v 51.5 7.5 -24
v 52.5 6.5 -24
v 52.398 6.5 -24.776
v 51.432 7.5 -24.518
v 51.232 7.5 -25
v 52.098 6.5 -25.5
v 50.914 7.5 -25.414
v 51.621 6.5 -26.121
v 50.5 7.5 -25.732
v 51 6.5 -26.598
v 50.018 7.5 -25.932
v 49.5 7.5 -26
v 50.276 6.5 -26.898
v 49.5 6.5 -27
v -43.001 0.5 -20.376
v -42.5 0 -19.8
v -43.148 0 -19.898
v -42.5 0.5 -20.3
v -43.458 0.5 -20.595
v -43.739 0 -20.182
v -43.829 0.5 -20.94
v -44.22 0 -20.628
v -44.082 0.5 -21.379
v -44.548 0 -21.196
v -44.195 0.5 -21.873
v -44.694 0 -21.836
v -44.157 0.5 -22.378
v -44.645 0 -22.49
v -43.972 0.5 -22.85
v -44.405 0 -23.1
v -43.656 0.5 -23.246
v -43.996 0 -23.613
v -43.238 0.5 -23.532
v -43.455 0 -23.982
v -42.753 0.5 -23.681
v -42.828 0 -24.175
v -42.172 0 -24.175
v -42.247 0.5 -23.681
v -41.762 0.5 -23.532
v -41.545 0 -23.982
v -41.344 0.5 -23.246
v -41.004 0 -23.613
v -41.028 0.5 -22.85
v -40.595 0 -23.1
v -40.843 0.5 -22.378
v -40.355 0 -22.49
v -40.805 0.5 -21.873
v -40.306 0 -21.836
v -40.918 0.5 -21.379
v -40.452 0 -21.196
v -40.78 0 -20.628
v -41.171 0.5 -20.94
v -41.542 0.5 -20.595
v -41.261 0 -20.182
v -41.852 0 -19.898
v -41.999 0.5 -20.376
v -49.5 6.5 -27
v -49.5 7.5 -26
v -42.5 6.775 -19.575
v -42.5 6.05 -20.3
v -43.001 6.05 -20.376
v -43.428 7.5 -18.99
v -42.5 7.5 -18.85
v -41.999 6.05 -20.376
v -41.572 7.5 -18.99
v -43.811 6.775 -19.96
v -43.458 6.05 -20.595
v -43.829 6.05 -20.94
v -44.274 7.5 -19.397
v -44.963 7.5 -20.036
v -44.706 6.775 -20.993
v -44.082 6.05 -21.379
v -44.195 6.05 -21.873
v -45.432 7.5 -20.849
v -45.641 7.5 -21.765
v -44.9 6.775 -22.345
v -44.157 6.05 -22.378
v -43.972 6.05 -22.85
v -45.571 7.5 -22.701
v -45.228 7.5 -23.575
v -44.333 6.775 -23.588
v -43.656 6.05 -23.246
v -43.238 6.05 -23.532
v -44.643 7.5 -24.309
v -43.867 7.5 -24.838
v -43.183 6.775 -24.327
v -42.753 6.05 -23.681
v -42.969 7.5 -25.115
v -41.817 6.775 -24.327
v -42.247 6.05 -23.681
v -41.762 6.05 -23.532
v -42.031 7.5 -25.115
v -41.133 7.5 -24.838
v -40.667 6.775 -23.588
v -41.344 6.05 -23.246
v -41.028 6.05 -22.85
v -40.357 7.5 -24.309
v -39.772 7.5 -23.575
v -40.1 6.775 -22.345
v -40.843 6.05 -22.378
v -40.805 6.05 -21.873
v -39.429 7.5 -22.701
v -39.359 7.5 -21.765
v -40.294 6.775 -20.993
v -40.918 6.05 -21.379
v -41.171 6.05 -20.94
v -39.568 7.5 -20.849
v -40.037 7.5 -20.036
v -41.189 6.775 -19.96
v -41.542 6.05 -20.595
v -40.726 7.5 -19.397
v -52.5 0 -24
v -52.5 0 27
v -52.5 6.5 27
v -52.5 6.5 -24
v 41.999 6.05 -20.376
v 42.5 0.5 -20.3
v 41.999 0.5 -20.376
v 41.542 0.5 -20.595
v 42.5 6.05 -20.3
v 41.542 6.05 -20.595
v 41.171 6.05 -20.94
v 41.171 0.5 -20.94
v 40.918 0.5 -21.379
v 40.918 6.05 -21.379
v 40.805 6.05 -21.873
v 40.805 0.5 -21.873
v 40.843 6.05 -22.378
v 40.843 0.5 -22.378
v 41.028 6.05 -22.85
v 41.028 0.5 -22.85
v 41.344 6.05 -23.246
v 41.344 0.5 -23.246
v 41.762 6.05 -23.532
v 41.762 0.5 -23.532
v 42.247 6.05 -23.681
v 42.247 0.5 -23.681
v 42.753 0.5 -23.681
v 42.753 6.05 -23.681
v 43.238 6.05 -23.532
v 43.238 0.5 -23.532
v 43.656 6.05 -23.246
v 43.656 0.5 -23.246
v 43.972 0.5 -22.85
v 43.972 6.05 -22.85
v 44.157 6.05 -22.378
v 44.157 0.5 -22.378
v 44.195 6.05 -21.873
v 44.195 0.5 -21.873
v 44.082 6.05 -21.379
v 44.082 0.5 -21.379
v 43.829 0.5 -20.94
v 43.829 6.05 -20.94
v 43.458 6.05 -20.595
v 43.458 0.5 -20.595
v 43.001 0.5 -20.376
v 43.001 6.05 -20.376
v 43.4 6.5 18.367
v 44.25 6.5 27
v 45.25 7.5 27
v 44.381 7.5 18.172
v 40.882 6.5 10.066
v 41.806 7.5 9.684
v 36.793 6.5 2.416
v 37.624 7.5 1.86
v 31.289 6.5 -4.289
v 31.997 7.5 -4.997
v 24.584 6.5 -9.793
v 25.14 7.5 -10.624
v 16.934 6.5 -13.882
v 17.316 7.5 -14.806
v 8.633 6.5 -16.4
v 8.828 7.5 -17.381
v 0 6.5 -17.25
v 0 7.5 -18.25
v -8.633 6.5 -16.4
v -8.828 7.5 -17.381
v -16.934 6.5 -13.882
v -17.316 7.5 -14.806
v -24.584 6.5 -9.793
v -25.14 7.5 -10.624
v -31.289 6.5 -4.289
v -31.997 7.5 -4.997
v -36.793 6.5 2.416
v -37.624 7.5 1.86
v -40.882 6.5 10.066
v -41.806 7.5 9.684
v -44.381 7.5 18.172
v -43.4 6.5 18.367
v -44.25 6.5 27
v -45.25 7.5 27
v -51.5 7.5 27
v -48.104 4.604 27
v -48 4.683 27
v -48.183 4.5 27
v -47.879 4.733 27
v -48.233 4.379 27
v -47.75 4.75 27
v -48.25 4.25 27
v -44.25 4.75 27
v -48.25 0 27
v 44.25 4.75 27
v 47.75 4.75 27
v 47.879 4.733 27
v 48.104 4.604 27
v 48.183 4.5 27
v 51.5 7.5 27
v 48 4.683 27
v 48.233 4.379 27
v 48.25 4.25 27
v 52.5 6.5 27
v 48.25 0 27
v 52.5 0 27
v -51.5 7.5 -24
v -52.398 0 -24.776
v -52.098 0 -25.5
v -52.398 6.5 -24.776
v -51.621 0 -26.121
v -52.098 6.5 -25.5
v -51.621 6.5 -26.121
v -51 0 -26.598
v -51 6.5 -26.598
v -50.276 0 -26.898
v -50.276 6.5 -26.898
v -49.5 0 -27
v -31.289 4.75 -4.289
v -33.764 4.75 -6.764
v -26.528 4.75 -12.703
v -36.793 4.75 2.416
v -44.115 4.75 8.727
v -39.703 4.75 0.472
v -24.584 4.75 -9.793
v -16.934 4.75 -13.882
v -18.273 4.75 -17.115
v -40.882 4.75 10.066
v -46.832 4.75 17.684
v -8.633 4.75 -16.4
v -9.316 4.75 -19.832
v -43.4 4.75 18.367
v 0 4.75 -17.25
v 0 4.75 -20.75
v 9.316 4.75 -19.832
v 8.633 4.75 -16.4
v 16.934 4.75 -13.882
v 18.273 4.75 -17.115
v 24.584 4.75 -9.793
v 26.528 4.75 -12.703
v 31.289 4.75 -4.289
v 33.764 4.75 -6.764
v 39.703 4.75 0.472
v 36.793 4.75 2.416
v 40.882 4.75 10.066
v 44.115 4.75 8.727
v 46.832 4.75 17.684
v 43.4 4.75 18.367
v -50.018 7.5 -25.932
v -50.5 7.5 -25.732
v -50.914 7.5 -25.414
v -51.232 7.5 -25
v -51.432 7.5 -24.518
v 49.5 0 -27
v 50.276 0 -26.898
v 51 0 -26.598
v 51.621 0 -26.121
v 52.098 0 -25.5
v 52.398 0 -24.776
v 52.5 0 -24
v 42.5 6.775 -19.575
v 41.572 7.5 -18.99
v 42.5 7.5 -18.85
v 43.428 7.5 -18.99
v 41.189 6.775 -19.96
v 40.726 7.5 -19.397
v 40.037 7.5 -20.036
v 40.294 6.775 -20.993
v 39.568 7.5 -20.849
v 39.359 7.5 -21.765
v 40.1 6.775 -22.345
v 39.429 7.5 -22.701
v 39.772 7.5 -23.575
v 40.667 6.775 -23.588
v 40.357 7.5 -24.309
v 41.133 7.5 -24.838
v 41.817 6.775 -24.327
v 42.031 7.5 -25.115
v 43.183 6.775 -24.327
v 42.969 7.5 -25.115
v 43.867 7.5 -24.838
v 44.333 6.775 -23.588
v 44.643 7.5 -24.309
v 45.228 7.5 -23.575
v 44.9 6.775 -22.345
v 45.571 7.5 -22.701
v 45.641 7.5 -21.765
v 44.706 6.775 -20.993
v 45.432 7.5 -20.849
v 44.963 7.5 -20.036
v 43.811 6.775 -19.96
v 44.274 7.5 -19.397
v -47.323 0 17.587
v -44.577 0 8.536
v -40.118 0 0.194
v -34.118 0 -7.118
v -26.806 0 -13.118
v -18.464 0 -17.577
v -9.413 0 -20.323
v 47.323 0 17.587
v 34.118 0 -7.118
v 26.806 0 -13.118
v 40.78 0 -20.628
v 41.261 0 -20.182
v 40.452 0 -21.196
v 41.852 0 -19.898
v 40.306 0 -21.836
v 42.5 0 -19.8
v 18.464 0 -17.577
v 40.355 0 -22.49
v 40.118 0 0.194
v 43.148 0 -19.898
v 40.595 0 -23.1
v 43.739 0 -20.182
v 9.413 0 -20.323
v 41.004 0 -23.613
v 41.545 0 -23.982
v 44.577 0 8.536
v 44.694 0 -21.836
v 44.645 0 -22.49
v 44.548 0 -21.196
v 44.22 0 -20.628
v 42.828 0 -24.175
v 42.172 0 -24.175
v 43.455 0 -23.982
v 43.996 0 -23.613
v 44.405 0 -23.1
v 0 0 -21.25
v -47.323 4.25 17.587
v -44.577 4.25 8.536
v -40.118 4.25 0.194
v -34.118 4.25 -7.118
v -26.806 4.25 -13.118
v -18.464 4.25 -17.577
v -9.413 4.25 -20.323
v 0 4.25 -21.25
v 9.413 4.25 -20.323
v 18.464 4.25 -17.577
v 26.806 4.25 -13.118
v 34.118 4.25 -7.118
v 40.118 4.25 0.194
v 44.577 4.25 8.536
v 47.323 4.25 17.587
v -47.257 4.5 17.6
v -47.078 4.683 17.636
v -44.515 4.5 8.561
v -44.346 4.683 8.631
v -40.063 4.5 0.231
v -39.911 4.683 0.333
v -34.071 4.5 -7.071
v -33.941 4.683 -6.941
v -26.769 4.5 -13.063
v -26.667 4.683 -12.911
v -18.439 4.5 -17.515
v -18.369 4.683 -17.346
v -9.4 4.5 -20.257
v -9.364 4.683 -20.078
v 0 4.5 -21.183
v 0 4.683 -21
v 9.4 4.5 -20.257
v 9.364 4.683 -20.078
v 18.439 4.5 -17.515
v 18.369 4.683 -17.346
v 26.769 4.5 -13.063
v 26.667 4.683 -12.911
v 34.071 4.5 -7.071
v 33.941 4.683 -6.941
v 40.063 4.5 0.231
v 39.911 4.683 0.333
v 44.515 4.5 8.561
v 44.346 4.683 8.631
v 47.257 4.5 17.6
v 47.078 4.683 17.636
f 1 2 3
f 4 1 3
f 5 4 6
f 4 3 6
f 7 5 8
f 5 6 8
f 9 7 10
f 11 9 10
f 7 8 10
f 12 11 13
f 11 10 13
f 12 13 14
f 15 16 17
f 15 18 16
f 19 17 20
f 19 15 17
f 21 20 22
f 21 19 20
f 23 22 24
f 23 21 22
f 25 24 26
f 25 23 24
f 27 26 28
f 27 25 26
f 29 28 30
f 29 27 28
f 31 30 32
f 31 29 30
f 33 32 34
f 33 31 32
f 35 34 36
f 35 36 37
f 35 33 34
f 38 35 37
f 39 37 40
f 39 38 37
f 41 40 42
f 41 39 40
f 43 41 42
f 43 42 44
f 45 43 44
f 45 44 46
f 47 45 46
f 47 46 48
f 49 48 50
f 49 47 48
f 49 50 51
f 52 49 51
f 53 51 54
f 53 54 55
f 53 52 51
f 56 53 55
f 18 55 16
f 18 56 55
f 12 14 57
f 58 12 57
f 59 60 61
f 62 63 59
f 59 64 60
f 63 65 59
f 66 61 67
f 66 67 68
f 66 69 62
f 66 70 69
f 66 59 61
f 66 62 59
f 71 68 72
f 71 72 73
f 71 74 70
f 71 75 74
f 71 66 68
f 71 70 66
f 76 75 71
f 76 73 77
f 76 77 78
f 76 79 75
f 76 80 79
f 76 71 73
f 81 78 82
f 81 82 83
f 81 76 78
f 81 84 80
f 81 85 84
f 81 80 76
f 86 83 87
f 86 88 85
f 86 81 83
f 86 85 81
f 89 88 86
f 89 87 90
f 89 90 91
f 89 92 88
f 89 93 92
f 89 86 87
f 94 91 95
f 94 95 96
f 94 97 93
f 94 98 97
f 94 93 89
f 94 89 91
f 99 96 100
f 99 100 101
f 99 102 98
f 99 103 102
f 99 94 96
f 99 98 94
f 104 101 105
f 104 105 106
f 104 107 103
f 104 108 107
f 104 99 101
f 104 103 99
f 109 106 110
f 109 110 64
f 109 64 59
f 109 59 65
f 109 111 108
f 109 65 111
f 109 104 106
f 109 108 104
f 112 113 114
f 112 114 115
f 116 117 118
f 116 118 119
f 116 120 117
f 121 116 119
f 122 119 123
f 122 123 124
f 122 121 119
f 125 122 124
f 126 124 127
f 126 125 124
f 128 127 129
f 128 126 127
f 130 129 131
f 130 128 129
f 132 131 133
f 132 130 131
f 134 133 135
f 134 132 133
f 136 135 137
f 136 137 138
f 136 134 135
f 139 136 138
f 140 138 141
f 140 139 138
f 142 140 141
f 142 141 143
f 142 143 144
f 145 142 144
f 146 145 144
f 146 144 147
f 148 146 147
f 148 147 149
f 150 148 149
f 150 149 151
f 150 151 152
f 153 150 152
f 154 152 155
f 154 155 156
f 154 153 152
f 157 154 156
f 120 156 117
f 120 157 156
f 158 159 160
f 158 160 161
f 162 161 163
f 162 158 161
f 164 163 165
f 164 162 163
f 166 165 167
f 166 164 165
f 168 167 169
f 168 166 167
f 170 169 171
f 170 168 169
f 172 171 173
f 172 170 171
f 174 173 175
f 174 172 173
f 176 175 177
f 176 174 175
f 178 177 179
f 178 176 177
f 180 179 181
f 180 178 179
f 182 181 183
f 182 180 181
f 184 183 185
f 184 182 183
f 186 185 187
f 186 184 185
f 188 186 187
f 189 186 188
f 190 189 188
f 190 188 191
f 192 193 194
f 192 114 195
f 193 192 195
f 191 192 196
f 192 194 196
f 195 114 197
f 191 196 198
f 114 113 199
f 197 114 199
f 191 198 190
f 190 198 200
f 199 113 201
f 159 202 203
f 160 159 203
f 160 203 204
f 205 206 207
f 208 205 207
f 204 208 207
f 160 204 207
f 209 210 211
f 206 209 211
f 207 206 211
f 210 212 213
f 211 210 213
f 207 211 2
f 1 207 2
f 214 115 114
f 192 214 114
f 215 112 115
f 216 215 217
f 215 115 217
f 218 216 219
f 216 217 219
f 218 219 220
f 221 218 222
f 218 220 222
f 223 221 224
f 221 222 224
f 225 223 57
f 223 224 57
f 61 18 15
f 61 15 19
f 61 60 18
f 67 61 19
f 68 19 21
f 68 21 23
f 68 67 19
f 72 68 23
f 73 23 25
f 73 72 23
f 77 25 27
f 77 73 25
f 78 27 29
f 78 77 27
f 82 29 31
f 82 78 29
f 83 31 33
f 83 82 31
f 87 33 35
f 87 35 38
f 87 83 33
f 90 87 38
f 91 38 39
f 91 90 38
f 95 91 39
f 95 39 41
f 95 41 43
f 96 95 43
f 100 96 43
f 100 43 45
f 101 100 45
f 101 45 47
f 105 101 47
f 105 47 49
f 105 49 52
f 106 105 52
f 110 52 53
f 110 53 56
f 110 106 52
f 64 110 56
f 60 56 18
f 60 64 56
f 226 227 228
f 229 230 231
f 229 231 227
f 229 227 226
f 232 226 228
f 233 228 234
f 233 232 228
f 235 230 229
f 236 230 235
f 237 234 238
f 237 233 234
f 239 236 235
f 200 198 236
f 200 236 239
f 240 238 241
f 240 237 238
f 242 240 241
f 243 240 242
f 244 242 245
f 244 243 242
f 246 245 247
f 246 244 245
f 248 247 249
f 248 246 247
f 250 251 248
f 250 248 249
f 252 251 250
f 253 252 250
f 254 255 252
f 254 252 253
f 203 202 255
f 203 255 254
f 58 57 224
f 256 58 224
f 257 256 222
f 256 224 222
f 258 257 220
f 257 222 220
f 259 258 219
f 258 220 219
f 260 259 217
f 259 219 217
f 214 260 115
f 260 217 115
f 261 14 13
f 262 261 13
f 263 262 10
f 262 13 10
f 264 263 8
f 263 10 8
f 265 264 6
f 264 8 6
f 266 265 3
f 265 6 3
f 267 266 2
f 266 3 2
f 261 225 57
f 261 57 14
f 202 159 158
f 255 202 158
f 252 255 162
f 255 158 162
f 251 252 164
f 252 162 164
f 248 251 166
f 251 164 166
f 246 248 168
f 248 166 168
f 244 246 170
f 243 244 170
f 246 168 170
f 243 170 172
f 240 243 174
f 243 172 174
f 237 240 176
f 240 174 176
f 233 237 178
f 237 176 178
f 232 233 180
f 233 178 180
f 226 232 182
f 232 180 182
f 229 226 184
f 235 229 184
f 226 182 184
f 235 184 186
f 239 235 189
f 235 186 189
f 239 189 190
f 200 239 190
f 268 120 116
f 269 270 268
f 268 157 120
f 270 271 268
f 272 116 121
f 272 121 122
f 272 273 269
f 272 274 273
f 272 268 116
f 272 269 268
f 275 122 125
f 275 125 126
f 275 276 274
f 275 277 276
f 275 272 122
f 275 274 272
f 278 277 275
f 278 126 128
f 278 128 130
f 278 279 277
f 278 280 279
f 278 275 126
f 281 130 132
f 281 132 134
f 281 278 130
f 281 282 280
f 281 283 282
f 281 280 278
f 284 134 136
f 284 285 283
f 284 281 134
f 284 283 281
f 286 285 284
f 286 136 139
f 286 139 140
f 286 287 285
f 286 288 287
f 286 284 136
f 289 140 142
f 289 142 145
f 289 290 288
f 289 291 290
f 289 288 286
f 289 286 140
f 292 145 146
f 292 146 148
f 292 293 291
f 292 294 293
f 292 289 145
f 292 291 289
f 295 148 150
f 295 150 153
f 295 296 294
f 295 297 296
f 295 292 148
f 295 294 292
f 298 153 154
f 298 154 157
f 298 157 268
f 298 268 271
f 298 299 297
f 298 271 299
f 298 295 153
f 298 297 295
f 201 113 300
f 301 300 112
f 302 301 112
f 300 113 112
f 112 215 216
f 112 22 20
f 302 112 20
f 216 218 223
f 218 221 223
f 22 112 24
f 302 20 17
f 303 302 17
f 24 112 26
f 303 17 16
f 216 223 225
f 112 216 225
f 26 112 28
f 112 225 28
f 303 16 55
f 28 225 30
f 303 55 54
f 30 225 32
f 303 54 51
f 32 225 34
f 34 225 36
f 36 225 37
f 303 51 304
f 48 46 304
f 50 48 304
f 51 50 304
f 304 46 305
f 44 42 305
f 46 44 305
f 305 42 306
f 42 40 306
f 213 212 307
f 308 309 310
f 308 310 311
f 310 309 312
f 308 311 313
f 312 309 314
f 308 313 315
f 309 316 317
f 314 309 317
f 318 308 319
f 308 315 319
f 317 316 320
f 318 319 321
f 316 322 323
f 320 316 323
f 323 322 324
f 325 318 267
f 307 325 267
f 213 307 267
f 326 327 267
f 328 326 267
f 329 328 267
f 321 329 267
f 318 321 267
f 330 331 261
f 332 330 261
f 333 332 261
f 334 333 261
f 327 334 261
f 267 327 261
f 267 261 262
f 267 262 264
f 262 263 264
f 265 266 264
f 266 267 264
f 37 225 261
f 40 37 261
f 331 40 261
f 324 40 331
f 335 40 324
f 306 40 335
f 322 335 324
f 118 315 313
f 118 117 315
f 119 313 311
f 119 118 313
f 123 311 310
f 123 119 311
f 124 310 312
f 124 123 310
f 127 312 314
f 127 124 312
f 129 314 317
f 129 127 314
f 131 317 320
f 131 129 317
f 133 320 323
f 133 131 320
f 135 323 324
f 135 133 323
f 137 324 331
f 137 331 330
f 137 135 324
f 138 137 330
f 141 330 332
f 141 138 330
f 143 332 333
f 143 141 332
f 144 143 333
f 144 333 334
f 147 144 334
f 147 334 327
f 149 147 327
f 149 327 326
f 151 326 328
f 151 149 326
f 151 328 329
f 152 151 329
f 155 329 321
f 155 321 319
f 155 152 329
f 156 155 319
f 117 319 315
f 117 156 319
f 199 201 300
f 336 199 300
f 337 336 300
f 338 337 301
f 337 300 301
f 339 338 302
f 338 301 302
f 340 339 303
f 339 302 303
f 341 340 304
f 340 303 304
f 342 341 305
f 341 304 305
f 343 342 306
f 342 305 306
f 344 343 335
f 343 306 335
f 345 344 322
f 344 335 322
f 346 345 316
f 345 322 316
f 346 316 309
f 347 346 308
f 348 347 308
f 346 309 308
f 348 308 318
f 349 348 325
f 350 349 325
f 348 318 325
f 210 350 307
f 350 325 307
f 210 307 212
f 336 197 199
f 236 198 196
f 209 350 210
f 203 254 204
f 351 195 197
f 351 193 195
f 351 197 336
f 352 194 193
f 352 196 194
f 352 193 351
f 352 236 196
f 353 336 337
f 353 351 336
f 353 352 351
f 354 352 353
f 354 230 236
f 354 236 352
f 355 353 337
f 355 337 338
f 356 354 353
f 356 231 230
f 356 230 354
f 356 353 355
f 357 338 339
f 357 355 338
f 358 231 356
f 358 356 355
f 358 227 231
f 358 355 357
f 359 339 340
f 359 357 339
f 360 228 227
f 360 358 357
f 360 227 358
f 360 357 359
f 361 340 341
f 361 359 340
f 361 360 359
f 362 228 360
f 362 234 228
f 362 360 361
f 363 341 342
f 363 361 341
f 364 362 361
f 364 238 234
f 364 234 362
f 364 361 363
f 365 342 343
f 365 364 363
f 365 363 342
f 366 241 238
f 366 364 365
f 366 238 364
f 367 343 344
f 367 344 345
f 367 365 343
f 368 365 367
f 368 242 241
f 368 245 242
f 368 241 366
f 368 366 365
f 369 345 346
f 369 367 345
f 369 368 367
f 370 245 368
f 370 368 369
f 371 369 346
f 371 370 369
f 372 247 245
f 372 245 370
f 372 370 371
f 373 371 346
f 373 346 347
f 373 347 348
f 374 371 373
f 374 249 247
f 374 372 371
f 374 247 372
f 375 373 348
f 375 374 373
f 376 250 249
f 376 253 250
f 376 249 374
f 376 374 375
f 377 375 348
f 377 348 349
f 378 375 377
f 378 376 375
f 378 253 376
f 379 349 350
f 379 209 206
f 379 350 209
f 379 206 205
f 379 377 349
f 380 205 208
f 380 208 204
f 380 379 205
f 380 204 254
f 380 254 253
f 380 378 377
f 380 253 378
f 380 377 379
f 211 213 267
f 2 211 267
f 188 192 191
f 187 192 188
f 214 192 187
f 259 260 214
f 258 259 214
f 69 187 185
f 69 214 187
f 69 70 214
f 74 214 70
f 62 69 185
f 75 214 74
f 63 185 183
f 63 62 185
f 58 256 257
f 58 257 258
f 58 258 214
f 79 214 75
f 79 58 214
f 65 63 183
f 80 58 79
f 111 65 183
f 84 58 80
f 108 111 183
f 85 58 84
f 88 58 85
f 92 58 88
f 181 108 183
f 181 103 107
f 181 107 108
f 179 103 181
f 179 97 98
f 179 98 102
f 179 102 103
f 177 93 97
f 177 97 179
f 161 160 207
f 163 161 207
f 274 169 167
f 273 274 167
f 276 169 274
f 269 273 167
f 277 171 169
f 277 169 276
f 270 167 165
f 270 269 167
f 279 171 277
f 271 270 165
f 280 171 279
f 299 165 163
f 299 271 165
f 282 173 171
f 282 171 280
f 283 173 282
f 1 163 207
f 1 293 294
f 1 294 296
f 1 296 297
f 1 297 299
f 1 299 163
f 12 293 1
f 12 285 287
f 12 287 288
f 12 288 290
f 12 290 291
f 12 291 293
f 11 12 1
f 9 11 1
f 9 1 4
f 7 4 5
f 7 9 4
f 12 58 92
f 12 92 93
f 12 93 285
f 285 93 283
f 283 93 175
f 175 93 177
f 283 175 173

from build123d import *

# Parameters (mm, degrees)
SKETCH1_W                                      = 105
SKETCH1_H                                      = 54
BOSS_EXTRUDE2_DEPTH                            = 7.5
SKETCH2_R                                      = 48.25
CUT_EXTRUDE1_DEPTH                             = 4.75
SKETCH3_R                                      = 44.25
CUT_EXTRUDE2_DEPTH                             = 60.510503275
CSK_FOR_M3_FLAT_HEAD_MACHINE_SCREW1_AT_2_COUNT = 2
CSK_FOR_M3_FLAT_HEAD_MACHINE_SCREW1_AT_2_PITCH = 85
FILLET1_R                                      = 3
CHAMFER1_SIZE                                  = 1
FILLET2_R                                      = 0.5


with BuildPart() as part:
    # Sketch1 → Boss-Extrude2 (new body)
    with BuildSketch(Plane(origin=(0, 0, 0), x_dir=(1, 0, 0), z_dir=(0, 1, 0))):
        Rectangle(SKETCH1_W, SKETCH1_H)
    extrude(amount=BOSS_EXTRUDE2_DEPTH)

    # Sketch2 → Cut-Extrude1 (cut)
    with BuildSketch(Plane.XZ):
        with Locations((0, 27)):
            Circle(SKETCH2_R)
    extrude(amount=-CUT_EXTRUDE1_DEPTH, mode=Mode.SUBTRACT)

    # Sketch3 → Cut-Extrude2 (cut, through all)
    with BuildSketch(Plane(origin=(0, 7.5, 0), x_dir=(1, 0, 0), z_dir=(0, 1, 0))):
        with Locations((0, -27)):
            Circle(SKETCH3_R)
    extrude(amount=-CUT_EXTRUDE2_DEPTH, mode=Mode.SUBTRACT)

    # Sketch5 → CSK for M3 Flat Head Machine Screw1 (revolve, cut)
    with BuildSketch(Plane(origin=(-42.5, 7.5, -22), x_dir=(0, 0, 1), z_dir=(1, 0, 0))):
        Polygon((0, 0), (0, 7.5), (2.2, 7.5), (1.7, 7), (1.7, 1.45), (3.15, 0), align=None)
    csk_for_m3_flat_head_machine_screw1 = revolve(axis=Axis((-42.5, 13.85, -22), (0, -1, 0)), mode=Mode.SUBTRACT)

    # CSK for M3 Flat Head Machine Screw1 at 2: CSK for M3 Flat Head Machine Screw1 ×2
    with Locations(*[(i * CSK_FOR_M3_FLAT_HEAD_MACHINE_SCREW1_AT_2_PITCH, 0, 0) for i in range(1, CSK_FOR_M3_FLAT_HEAD_MACHINE_SCREW1_AT_2_COUNT)]):
        add(csk_for_m3_flat_head_machine_screw1, mode=Mode.SUBTRACT)

    # Fillet1
    fillet1_edges = [part.edges().sort_by_distance(p)[0] for p in [
        (-52.5, 3.75, -27),
        (52.5, 3.75, -27),
    ]]
    fillet(fillet1_edges, radius=FILLET1_R)

    # Chamfer1
    chamfer1_edges = [part.edges().sort_by_distance(p)[0] for p in [
        (0, 7.5, -17.25),
        (52.5, 7.5, 1.5),
        (-52.5, 7.5, 1.5),
        (0, 7.5, -27),
        (51.621320344, 7.5, -26.121320344),
        (-51.621320344, 7.5, -26.121320344),
    ]]
    chamfer(chamfer1_edges, length=CHAMFER1_SIZE)

    # Fillet2
    fillet2_edges = [part.edges().sort_by_distance(p)[0] for p in [
        (0, 4.75, -21.25),
    ]]
    fillet(fillet2_edges, radius=FILLET2_R)


solid = part.part
